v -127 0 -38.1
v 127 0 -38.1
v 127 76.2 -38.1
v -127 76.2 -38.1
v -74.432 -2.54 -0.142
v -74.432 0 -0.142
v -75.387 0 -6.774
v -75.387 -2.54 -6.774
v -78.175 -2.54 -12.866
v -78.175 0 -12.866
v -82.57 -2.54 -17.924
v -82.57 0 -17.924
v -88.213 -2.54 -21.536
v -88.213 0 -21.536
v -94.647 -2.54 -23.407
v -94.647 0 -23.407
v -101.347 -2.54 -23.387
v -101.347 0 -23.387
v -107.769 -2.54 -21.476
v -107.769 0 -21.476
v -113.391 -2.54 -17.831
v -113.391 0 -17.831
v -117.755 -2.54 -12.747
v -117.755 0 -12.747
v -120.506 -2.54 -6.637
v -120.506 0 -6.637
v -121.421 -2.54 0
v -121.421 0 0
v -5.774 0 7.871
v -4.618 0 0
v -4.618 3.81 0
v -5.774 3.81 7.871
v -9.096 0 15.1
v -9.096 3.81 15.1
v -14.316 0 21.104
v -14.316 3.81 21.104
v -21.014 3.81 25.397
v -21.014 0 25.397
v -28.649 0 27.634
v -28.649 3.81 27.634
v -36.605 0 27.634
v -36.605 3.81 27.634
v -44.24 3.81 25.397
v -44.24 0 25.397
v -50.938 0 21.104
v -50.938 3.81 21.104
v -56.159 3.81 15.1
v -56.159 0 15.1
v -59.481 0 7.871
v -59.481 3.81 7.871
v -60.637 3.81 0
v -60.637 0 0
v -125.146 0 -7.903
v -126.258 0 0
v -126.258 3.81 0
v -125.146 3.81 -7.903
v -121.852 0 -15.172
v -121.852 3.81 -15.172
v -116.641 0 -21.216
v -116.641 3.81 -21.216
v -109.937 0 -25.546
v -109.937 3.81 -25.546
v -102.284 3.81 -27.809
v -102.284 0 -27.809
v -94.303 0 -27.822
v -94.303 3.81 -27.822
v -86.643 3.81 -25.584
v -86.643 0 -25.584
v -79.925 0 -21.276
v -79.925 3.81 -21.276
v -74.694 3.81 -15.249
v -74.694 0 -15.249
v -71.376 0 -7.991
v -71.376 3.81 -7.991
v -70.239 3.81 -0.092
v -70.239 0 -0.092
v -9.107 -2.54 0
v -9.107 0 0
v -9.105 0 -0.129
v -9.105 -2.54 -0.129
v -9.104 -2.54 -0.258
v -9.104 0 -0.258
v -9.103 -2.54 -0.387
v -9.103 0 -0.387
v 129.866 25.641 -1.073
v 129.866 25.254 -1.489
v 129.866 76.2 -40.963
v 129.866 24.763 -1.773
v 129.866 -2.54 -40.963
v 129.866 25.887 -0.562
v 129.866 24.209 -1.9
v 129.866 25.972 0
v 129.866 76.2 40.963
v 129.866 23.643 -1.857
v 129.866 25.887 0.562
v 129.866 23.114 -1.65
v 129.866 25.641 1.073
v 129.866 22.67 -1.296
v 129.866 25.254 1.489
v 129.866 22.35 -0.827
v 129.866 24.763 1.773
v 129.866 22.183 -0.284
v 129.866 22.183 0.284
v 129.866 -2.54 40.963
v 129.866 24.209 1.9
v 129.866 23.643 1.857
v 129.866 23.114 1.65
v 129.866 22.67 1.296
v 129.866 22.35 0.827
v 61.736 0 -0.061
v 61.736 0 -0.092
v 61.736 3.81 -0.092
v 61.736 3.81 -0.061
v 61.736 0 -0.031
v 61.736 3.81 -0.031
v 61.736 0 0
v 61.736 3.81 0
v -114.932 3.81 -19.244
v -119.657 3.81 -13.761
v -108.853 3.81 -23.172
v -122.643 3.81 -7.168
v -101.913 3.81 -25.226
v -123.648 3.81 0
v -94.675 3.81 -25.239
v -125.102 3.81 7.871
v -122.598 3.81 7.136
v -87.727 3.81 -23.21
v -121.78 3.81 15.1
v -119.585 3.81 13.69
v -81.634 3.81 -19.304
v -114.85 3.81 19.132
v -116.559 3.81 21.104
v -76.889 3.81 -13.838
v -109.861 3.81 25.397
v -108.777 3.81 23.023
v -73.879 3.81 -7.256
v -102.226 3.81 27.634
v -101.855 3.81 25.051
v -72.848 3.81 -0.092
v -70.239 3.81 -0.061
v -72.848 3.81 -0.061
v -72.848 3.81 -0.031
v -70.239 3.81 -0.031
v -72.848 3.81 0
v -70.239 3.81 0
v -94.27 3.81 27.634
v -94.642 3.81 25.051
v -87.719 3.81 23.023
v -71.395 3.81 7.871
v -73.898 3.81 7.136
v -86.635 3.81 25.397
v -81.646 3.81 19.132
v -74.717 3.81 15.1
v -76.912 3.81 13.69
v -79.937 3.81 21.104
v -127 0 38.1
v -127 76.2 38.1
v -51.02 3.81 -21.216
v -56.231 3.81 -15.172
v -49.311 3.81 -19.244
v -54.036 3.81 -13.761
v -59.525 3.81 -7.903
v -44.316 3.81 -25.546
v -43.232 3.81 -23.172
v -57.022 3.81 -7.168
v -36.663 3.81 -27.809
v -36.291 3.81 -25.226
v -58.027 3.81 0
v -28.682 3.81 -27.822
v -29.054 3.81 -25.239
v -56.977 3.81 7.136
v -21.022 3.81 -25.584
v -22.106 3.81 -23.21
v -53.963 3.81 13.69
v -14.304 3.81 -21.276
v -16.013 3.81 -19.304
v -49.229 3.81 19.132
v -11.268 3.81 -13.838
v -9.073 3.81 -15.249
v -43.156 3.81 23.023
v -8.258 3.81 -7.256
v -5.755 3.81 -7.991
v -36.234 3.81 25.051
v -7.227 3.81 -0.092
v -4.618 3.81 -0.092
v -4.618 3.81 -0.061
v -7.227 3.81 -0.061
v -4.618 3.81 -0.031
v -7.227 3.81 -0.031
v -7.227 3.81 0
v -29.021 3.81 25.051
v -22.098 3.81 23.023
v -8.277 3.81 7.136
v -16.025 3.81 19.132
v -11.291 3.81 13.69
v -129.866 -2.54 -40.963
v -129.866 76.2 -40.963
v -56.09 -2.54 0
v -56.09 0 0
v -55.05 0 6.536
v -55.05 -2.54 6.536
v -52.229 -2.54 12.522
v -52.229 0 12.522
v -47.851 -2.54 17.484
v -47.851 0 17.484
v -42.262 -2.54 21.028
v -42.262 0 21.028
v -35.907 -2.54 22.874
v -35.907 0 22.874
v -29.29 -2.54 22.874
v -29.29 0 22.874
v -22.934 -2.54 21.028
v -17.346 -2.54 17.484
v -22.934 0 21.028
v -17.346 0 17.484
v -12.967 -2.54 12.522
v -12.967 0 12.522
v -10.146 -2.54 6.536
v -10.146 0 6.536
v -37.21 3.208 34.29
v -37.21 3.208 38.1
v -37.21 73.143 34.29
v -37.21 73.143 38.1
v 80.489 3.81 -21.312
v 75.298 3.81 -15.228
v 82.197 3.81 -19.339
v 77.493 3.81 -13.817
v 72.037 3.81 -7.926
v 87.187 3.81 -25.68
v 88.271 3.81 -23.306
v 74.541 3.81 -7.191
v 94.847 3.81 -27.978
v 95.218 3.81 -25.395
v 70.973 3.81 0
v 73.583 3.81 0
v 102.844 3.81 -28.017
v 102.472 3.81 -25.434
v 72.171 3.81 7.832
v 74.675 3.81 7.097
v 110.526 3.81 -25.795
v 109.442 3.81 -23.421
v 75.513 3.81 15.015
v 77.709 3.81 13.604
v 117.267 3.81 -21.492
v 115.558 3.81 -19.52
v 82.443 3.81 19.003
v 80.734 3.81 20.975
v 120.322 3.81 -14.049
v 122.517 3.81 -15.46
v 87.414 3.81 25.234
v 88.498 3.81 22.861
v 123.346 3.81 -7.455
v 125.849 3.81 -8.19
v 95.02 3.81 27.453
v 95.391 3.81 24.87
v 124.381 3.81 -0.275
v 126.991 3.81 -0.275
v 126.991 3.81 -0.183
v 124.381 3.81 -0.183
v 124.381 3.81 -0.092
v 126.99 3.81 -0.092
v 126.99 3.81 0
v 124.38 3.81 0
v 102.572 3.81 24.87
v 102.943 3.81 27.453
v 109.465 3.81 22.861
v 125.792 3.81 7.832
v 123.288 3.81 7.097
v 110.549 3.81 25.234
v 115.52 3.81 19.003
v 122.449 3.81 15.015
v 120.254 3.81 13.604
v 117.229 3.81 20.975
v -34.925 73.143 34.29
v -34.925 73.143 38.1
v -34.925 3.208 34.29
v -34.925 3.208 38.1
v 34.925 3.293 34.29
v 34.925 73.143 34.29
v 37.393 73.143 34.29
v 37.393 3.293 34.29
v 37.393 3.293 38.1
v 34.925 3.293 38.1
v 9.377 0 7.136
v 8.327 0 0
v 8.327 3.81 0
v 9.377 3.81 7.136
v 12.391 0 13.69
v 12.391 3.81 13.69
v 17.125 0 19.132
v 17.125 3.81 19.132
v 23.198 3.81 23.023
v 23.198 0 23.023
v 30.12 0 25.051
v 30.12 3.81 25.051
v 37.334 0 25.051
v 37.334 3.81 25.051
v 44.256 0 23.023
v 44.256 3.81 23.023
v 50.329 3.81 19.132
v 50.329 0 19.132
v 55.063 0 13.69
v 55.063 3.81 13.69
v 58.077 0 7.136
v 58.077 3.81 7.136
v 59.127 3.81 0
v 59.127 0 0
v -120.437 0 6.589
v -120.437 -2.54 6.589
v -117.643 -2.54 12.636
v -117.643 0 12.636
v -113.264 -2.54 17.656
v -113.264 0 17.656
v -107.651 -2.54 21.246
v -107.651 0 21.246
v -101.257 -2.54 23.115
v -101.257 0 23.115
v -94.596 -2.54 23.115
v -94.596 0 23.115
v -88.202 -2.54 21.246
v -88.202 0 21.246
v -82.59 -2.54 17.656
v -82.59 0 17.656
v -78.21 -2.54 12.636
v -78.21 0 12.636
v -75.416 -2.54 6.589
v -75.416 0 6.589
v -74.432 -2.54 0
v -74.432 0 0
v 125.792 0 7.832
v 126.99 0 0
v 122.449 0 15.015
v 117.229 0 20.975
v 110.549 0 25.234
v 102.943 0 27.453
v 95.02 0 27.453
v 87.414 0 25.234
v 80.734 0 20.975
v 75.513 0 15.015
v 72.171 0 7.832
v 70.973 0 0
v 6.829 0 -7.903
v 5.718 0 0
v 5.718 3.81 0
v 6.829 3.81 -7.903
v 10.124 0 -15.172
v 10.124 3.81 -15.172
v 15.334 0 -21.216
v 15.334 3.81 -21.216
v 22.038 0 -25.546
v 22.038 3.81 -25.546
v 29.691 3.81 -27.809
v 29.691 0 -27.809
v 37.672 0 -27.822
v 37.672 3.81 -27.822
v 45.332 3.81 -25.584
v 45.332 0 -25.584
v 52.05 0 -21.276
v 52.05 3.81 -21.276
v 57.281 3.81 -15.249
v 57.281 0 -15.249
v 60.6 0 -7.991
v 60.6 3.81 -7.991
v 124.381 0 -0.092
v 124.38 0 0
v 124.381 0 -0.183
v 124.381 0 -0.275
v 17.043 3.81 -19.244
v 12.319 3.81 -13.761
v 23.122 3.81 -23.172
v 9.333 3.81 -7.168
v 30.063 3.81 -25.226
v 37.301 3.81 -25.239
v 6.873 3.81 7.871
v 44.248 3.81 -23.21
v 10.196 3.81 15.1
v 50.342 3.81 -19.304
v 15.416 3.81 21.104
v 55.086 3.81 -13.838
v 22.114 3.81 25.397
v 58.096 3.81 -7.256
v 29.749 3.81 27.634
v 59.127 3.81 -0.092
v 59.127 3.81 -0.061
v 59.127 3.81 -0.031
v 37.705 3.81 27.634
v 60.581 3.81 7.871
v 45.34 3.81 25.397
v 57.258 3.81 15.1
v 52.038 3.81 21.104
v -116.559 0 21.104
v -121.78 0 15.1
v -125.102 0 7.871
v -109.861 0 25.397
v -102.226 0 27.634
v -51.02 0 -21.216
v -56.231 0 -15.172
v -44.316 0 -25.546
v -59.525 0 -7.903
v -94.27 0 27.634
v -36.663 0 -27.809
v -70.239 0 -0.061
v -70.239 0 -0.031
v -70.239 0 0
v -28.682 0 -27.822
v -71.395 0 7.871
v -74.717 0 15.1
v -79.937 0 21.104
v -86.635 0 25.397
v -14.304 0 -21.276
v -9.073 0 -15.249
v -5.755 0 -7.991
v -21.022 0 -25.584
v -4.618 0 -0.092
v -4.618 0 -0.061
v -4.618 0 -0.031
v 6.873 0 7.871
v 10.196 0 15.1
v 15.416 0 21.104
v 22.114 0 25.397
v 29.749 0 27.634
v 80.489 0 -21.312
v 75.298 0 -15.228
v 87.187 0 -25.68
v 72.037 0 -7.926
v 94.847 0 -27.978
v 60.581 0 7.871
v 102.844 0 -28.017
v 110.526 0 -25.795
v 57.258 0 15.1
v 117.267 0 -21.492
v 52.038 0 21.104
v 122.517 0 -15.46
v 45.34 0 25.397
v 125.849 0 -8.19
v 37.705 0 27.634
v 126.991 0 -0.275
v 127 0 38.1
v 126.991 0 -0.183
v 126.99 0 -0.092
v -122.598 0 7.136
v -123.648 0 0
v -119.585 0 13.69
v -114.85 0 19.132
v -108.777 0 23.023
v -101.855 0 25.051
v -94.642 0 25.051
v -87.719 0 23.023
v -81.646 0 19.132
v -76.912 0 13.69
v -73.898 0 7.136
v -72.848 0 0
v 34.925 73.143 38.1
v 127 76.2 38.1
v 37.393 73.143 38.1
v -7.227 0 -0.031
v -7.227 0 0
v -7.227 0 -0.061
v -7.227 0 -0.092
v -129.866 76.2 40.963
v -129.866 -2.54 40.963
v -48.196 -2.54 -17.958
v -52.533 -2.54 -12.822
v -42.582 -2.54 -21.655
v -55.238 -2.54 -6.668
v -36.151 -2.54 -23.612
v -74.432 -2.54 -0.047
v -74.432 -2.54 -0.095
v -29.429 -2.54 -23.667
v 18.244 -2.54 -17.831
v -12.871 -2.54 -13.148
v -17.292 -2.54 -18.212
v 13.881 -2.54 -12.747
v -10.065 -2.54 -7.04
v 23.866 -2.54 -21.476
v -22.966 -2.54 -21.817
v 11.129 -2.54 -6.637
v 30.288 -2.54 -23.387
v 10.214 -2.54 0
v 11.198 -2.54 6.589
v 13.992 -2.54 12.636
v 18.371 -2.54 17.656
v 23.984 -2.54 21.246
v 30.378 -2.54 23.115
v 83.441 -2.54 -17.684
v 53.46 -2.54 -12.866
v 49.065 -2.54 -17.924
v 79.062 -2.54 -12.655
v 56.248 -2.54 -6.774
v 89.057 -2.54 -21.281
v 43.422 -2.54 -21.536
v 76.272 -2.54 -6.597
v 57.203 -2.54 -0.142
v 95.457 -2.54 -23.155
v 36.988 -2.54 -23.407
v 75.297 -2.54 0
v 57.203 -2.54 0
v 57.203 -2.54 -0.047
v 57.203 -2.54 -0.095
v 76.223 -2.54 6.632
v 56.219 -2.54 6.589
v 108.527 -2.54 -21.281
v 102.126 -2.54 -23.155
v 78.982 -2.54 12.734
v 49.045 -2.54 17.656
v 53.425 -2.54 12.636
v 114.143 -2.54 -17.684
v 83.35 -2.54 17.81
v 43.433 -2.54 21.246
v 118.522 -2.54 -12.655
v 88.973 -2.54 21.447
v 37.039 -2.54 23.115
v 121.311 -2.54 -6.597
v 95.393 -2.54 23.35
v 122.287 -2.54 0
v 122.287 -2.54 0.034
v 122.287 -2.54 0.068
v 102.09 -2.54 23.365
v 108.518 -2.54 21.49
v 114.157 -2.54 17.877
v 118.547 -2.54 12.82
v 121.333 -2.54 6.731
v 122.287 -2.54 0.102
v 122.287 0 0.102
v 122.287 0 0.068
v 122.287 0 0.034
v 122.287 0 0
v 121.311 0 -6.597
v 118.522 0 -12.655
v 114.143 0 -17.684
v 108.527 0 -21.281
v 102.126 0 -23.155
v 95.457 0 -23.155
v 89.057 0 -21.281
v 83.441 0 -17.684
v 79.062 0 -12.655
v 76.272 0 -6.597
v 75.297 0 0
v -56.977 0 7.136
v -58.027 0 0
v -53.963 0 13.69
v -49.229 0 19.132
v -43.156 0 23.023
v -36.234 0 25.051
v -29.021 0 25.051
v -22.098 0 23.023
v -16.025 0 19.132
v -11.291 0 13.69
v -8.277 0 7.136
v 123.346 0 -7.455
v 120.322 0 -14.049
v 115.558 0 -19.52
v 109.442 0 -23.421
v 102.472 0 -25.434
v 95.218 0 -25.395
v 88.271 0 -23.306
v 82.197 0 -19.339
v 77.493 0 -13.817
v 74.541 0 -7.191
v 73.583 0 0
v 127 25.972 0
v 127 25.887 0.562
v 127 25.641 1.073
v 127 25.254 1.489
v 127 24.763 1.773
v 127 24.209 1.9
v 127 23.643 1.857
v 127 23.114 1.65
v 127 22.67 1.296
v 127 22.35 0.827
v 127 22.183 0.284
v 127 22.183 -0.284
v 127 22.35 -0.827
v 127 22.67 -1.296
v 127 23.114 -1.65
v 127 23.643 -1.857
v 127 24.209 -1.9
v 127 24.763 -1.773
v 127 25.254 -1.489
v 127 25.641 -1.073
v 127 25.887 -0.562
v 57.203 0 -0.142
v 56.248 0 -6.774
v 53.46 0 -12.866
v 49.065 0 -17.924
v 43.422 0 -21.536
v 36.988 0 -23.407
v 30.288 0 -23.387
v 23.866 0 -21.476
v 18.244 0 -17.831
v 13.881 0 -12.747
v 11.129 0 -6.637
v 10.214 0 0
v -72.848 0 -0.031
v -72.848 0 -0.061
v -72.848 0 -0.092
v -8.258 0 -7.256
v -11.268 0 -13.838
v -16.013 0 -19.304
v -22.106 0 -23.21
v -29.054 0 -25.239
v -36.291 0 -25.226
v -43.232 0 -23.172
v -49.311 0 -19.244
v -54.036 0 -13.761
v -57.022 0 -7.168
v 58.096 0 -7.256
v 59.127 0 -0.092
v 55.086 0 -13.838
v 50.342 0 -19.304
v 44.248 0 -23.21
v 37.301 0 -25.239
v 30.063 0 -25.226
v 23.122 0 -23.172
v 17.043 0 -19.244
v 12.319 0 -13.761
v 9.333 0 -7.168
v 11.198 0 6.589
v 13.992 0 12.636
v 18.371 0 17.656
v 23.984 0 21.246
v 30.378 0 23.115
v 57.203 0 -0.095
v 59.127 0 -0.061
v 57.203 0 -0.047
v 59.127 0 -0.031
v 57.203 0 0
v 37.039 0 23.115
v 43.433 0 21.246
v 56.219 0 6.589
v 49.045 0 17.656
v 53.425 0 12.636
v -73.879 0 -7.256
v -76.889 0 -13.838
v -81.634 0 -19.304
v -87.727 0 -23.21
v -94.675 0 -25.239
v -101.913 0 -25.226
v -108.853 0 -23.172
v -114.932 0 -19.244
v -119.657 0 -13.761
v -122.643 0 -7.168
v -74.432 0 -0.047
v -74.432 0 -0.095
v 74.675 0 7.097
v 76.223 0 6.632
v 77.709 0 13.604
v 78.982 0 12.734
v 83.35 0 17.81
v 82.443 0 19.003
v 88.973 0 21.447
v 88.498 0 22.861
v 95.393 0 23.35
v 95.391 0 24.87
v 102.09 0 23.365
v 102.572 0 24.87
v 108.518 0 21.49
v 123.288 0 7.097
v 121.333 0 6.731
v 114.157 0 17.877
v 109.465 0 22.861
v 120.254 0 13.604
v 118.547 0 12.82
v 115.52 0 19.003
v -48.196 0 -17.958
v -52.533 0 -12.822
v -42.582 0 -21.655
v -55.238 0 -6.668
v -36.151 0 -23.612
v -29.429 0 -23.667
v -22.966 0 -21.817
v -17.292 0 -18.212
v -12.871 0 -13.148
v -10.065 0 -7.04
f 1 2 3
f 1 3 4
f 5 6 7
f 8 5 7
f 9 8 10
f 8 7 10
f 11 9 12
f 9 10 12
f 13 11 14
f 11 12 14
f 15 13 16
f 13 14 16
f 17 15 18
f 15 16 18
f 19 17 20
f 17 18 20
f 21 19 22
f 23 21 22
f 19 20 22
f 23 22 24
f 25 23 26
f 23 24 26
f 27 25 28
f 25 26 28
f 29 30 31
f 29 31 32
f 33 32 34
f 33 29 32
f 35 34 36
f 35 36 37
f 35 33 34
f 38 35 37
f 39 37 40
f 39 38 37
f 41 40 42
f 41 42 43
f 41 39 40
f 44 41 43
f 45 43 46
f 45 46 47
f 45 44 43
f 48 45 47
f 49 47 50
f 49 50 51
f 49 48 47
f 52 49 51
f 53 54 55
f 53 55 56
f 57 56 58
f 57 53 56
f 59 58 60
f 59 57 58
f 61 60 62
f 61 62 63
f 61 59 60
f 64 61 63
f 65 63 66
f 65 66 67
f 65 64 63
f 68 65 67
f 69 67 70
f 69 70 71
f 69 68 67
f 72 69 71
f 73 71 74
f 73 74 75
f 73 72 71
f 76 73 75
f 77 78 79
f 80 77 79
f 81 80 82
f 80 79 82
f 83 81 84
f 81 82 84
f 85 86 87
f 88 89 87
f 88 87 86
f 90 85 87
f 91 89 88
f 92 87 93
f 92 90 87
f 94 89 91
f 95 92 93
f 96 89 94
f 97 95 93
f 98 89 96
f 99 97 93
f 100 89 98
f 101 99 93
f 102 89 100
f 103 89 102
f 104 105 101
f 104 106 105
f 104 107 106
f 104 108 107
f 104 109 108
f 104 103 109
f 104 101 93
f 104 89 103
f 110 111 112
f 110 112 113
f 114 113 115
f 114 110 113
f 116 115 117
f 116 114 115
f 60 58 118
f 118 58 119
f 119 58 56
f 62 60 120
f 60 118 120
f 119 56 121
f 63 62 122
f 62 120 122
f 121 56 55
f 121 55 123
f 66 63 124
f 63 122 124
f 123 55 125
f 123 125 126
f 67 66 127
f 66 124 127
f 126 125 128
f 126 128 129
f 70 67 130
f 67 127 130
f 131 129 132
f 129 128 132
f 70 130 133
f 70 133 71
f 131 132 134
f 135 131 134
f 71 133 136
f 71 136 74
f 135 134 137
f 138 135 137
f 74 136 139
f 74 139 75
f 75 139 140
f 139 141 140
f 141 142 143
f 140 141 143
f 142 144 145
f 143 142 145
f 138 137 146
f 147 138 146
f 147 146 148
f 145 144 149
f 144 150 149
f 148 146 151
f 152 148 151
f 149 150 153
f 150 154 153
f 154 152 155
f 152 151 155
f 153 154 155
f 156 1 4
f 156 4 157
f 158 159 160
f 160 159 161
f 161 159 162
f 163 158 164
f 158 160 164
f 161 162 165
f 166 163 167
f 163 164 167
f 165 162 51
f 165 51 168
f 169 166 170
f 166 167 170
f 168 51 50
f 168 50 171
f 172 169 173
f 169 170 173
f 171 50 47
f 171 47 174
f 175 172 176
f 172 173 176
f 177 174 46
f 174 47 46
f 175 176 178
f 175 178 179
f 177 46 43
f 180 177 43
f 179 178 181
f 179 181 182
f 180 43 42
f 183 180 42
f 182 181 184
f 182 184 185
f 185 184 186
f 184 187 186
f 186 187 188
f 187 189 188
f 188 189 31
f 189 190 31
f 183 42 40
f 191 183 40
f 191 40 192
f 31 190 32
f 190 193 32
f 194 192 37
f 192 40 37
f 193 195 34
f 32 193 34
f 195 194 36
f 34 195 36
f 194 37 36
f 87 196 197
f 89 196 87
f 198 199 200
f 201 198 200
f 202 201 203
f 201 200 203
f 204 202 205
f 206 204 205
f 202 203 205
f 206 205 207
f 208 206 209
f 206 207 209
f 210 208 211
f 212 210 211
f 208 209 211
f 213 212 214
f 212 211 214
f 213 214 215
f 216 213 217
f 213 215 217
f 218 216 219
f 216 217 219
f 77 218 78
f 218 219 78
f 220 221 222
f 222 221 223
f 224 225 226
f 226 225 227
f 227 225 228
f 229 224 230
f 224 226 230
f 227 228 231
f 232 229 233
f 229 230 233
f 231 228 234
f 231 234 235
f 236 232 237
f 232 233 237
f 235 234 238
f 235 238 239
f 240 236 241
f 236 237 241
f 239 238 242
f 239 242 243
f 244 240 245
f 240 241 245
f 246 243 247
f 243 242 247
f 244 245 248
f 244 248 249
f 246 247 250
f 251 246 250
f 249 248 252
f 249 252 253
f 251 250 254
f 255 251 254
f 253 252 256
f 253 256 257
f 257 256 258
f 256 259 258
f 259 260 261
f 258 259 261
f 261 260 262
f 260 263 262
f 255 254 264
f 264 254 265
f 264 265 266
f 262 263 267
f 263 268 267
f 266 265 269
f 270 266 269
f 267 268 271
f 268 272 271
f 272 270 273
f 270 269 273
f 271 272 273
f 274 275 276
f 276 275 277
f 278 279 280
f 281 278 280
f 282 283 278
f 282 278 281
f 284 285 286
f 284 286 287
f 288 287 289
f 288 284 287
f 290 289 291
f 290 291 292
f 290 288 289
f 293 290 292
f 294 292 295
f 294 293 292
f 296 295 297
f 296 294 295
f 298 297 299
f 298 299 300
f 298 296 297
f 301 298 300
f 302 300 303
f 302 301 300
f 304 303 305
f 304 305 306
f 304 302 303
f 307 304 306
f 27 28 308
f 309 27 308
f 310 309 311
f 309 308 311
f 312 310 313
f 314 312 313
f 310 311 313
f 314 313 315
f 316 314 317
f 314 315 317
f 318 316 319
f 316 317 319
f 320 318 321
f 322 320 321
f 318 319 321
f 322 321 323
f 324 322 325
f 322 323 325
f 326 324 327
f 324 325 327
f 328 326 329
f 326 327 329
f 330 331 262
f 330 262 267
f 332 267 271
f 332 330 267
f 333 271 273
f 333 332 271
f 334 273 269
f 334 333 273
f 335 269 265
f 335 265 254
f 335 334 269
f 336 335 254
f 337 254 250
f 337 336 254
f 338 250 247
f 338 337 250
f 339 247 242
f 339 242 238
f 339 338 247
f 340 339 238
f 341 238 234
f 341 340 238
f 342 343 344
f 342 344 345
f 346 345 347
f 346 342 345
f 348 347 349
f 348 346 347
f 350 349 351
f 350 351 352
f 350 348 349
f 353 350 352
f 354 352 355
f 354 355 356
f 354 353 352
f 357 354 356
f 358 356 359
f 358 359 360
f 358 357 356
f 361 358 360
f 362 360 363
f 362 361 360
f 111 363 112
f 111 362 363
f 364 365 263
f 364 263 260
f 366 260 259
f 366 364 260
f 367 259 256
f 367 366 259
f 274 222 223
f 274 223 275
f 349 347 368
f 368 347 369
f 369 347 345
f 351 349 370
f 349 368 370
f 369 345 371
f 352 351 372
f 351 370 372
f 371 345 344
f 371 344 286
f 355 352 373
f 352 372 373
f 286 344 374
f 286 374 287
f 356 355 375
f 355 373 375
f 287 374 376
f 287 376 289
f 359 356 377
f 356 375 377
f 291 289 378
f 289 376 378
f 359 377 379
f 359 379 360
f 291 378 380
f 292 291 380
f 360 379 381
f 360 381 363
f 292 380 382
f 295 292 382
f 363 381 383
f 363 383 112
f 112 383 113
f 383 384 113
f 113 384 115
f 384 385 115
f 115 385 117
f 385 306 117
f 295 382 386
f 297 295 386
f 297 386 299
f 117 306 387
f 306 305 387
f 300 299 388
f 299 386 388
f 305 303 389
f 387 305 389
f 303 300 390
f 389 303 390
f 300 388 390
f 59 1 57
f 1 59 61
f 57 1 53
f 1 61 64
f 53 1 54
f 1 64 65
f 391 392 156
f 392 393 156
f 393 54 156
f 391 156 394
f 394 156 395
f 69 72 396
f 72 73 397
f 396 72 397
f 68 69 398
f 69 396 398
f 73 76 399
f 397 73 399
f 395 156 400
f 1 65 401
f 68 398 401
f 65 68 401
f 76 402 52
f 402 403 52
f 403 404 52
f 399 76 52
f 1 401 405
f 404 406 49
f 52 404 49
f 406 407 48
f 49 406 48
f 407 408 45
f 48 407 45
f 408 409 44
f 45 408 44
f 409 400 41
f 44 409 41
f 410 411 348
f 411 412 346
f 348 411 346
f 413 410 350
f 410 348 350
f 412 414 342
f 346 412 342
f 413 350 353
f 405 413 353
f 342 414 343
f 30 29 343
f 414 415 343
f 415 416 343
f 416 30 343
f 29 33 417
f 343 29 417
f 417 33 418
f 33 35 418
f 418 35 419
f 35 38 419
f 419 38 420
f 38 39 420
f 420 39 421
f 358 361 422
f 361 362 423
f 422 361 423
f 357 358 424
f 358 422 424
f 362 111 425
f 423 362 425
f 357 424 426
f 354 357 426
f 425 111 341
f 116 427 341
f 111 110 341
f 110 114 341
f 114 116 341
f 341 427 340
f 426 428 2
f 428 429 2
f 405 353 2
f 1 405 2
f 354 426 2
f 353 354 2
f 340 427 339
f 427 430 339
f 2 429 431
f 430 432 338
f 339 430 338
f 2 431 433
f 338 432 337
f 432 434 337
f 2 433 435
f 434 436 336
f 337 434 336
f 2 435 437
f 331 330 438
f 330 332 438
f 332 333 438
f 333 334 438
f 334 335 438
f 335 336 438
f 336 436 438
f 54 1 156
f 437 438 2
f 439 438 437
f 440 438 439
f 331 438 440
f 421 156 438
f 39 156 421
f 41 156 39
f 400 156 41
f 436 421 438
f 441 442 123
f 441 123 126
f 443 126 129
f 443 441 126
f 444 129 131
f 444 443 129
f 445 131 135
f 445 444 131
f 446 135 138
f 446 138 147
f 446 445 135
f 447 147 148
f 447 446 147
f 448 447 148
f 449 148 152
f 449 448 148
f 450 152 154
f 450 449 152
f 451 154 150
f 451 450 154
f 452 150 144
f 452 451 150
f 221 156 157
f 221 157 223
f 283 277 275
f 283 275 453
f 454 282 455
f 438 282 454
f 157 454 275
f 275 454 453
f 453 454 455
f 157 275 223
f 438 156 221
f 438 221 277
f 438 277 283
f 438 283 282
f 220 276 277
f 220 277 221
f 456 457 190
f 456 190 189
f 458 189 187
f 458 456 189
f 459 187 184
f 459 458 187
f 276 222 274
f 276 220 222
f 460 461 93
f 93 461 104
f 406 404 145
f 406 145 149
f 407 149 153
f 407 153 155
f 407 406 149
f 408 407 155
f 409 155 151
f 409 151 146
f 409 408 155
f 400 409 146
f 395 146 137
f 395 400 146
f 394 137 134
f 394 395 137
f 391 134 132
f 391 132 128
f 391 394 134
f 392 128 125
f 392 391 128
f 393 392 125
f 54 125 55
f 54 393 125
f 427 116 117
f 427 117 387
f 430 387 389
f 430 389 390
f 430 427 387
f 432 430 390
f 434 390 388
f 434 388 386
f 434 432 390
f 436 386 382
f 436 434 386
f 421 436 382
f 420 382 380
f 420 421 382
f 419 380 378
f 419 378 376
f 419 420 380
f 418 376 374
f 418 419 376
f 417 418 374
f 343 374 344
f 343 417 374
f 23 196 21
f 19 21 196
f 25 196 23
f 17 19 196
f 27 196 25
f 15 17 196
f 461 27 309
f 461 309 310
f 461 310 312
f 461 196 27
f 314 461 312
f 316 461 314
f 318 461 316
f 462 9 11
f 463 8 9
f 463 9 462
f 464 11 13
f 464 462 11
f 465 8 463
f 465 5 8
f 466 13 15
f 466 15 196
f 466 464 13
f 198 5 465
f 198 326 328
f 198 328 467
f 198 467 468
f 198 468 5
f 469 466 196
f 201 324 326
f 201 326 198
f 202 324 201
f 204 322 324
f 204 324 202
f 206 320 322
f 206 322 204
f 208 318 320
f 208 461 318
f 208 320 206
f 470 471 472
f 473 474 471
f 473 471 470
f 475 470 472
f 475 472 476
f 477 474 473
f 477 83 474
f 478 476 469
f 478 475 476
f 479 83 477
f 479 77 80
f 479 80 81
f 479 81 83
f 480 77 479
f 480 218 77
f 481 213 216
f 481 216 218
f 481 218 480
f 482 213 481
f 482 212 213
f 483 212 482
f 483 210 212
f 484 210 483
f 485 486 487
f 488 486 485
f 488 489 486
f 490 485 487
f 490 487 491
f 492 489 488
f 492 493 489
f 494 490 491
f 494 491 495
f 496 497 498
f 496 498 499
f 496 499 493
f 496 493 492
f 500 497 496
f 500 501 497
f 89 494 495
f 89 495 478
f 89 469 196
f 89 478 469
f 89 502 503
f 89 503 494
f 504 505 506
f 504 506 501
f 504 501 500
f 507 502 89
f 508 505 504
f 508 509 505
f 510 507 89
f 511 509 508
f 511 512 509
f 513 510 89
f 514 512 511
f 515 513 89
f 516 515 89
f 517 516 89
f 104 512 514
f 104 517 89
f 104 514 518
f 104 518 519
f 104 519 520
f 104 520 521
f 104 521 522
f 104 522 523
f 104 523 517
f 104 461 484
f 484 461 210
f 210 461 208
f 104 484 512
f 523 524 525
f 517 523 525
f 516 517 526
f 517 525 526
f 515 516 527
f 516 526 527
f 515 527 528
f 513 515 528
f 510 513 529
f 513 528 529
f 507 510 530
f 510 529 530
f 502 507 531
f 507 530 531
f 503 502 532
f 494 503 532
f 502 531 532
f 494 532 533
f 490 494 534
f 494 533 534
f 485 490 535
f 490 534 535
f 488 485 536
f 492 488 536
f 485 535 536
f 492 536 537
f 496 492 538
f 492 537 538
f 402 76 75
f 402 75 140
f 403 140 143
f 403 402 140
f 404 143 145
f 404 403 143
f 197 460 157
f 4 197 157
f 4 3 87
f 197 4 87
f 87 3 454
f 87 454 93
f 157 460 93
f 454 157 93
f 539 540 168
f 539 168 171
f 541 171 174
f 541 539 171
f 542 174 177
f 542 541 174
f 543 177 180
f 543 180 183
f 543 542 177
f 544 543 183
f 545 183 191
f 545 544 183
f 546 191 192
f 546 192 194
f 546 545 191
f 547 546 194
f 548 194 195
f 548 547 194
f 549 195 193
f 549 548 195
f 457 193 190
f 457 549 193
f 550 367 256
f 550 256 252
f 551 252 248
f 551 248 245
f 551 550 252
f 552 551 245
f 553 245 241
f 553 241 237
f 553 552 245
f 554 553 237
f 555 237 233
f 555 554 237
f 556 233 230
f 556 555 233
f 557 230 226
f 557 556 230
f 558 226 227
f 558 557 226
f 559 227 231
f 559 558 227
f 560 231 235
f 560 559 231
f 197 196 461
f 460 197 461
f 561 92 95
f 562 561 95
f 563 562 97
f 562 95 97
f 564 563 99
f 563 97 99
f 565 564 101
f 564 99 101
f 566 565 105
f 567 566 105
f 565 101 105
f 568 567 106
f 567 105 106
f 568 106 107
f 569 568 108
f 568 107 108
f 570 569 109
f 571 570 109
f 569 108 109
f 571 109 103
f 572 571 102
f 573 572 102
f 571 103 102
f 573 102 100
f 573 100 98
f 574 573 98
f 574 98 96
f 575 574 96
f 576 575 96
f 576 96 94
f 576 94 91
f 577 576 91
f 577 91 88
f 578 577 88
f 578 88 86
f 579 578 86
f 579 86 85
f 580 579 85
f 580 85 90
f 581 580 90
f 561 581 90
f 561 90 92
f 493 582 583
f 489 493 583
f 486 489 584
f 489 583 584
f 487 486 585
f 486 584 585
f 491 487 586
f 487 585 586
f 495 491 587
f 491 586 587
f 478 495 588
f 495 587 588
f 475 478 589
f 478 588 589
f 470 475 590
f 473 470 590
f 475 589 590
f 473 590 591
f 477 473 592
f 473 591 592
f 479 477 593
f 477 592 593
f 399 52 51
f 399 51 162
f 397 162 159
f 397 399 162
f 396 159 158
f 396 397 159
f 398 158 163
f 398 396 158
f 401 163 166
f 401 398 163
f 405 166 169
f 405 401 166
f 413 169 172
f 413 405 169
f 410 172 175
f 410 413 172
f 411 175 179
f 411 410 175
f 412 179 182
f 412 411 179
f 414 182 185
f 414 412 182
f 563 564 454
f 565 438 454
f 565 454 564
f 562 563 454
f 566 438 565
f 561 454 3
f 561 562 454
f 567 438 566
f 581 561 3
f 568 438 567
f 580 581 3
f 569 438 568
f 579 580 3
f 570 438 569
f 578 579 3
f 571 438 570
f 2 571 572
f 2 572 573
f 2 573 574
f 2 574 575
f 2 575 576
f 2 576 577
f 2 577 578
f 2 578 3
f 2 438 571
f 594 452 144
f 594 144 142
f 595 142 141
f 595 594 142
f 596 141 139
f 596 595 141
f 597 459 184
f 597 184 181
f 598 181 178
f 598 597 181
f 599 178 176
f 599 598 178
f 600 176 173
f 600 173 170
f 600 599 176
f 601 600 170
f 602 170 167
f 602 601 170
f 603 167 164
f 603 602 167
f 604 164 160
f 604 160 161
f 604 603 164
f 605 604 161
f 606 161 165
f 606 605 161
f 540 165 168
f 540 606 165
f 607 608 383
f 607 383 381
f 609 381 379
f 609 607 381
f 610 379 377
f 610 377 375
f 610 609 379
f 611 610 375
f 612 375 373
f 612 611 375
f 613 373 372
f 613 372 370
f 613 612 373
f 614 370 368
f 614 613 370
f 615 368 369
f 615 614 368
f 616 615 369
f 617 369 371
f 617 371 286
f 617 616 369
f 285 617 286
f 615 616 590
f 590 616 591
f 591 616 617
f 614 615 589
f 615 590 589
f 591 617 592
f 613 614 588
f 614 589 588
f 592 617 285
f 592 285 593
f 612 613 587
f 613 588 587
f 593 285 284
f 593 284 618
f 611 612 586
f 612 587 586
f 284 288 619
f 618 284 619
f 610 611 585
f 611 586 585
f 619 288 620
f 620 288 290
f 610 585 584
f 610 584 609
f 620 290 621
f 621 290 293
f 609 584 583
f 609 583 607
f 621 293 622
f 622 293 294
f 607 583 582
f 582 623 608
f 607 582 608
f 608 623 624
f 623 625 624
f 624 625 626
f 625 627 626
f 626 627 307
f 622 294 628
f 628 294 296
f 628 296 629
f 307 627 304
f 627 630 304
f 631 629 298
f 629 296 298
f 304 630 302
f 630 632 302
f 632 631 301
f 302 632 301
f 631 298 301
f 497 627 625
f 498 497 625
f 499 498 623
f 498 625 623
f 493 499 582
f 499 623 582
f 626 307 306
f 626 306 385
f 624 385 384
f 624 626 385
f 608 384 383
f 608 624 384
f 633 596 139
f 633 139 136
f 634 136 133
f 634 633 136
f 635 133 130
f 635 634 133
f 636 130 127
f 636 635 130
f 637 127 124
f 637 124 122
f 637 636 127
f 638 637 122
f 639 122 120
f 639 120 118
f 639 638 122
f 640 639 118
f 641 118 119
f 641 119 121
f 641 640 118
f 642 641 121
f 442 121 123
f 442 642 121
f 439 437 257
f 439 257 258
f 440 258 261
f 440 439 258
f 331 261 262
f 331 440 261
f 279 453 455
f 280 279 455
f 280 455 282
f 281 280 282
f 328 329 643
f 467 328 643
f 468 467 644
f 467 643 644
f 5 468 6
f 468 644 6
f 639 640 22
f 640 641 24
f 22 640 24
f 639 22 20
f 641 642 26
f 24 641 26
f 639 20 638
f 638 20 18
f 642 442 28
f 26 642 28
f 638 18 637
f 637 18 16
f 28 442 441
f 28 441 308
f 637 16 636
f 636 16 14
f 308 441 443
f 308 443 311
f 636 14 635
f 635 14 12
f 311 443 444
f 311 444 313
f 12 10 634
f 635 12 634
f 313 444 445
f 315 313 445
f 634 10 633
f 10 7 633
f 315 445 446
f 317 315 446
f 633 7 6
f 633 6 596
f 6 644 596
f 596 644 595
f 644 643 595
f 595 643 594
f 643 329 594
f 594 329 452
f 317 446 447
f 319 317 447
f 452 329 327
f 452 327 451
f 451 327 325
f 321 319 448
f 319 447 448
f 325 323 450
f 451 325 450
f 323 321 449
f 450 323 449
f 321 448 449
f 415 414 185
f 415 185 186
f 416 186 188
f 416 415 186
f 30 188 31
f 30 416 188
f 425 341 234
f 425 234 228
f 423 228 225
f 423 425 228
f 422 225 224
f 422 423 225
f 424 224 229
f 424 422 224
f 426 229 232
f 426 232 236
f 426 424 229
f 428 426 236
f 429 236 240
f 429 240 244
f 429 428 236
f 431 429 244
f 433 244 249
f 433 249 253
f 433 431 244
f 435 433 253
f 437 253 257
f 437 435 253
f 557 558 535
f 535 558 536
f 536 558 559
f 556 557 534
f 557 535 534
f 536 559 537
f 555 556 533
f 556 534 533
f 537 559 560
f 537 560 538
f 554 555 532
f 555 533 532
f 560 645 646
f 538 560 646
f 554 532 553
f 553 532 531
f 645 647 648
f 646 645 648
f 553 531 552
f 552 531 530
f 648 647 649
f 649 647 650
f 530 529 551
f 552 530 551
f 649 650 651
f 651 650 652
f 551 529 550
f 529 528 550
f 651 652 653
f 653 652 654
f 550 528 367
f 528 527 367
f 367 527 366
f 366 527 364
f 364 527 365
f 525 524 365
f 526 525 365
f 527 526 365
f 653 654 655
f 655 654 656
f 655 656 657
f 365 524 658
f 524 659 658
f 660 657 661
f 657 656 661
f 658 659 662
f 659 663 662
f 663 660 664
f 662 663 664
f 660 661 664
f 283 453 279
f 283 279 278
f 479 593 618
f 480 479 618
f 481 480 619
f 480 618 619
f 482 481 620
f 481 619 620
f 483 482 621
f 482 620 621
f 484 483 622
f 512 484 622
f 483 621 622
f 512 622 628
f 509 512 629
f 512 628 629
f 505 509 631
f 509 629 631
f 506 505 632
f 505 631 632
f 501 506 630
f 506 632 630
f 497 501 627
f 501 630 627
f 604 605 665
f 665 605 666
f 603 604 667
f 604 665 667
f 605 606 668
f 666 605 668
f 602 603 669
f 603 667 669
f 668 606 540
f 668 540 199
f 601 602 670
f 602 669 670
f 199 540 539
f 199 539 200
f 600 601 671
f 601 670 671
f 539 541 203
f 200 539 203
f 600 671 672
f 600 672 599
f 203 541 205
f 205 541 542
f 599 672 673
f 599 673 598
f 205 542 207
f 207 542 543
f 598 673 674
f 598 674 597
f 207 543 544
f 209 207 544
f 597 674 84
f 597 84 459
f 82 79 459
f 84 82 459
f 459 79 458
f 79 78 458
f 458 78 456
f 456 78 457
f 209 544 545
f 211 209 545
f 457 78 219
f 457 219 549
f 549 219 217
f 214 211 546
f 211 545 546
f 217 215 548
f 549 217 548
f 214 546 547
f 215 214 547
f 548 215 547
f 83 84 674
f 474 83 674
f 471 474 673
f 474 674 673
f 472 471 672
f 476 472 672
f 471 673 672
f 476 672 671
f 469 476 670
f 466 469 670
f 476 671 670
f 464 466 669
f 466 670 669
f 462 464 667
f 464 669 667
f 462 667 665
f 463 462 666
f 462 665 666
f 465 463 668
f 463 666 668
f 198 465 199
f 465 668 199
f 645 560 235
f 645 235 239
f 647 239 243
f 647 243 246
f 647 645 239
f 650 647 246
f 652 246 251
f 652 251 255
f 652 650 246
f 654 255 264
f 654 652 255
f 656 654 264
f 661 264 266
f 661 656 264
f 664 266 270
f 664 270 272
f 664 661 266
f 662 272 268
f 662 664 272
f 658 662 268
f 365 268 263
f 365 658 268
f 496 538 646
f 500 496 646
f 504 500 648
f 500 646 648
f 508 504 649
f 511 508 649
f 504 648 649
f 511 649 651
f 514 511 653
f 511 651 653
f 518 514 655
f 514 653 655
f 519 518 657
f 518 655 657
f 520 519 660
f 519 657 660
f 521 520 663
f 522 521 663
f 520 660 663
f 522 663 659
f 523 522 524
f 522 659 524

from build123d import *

# Parameters (mm, degrees)
F0_W     = 259.731292
F0_H     = 81.926138
F1_DEPTH = 2.54
F2_DEPTH = 76.2
F4_DEPTH = 3.81
F5_R     = 1.905
F6_DEPTH = 25.4
F7_W     = 2.467993
F7_H     = 69.85
F8_DEPTH = 3.81


with BuildPart() as f1:
    # F0 (on Front) → F1 (new body)
    with BuildSketch(Plane.XZ):
        Rectangle(F0_W, F0_H)
        Polygon((-127, 38.1), (127, 38.1), (127, 0), (127, -38.1), (-127, -38.1), (-127, 0), align=None, mode=Mode.SUBTRACT)
        with BuildLine():
            Line((127, 0), (127, 38.1))
            Line((127, 38.1), (-127, 38.1))
            Line((-127, 38.1), (-127, 0))
            Line((-127, 0), (-121.421141, 0))
            ThreePointArc((-121.421141, 0), (-97.926572, 23.352705), (-74.432003, 0))
            Line((-74.432003, 0), (-63.5, 0))
            Line((-63.5, 0), (-56.090223, 0))
            ThreePointArc((-56.090223, 0), (-32.59841, 23.10803), (-9.106597, 0))
            Line((-9.106597, 0), (0, 0))
            Line((0, 0), (10.213884, 0))
            ThreePointArc((10.213884, 0), (33.708453, 23.352705), (57.203022, 0))
            Line((57.203022, 0), (63.5, 0))
            Line((63.5, 0), (75.297165, 0))
            ThreePointArc((75.297165, 0), (98.740752, 23.597324), (122.286942, 0.10238))
            ThreePointArc((122.286942, 0.10238), (122.286886, 0.05119), (122.286719, 0))
            Line((122.286719, 0), (127, 0))
        make_face()
        with BuildLine():
            Line((127, -38.1), (127, 0))
            Line((127, 0), (122.286719, 0))
            ThreePointArc((122.286719, 0), (98.791942, -23.39262), (75.297165, 0))
            Line((75.297165, 0), (63.5, 0))
            Line((63.5, 0), (57.203022, 0))
            ThreePointArc((57.203022, 0), (57.203345, -0.071147), (57.203453, -0.142295))
            ThreePointArc((57.203453, -0.142295), (33.637305, -23.637187), (10.213884, 0))
            Line((10.213884, 0), (0, 0))
            Line((0, 0), (-9.106597, 0))
            ThreePointArc((-9.106597, 0), (-9.104207, -0.193478), (-9.10341, -0.38697))
            ThreePointArc((-9.10341, -0.38697), (-32.791901, -23.881173), (-56.090223, 0))
            Line((-56.090223, 0), (-63.5, 0))
            Line((-63.5, 0), (-74.432003, 0))
            ThreePointArc((-74.432003, 0), (-74.43168, -0.071147), (-74.431572, -0.142295))
            ThreePointArc((-74.431572, -0.142295), (-97.99772, -23.637187), (-121.421141, 0))
            Line((-121.421141, 0), (-127, 0))
            Line((-127, 0), (-127, -38.1))
            Line((-127, -38.1), (127, -38.1))
        make_face()
    extrude(amount=F1_DEPTH)

    # F0 (on Front) → F2 (join)
    with BuildSketch(Plane.XZ):
        Rectangle(F0_W, F0_H)
        Polygon((-127, 38.1), (127, 38.1), (127, 0), (127, -38.1), (-127, -38.1), (-127, 0), align=None, mode=Mode.SUBTRACT)
    extrude(amount=-F2_DEPTH)

    # F3 (on face) → F4 (join)
    with BuildSketch(Plane.XZ):
        with BuildLine():
            Line((73.582936, 0), (70.973357, 0))
            ThreePointArc((70.973357, 0), (98.843972, -28.284051), (126.990887, -0.274948))
            ThreePointArc((126.990887, -0.274948), (126.99055, -0.137473), (126.989538, 0))
            Line((126.989538, 0), (124.379959, 0))
            ThreePointArc((124.379959, 0), (124.381075, -0.137472), (124.381448, -0.274948))
            ThreePointArc((124.381448, -0.274948), (98.843971, -25.674576), (73.582936, 0))
        make_face()
        with BuildLine():
            ThreePointArc((126.989538, 0), (98.981448, 27.734491), (70.973357, 0))
            Line((70.973357, 0), (73.582936, 0))
            ThreePointArc((73.582936, 0), (98.981448, 25.125052), (124.379959, 0))
            Line((124.379959, 0), (126.989538, 0))
        make_face()
        with BuildLine():
            ThreePointArc((61.736299, 0), (33.727009, 27.91779), (5.717719, 0))
            Line((5.717719, 0), (8.327174, 0))
            ThreePointArc((8.327174, 0), (33.727009, 25.308351), (59.126844, 0))
            Line((59.126844, 0), (61.736299, 0))
        make_face()
        with BuildLine():
            Line((8.327174, 0), (5.717719, 0))
            ThreePointArc((5.717719, 0), (33.681184, -28.101052), (61.736449, -0.091649))
            ThreePointArc((61.736449, -0.091649), (61.736411, -0.045825), (61.736299, 0))
            Line((61.736299, 0), (59.126844, 0))
            ThreePointArc((59.126844, 0), (59.126968, -0.045825), (59.127009, -0.091649))
            ThreePointArc((59.127009, -0.091649), (33.681184, -25.491608), (8.327174, 0))
        make_face()
        with BuildLine():
            ThreePointArc((-58.027052, 0), (-32.627217, 25.308351), (-7.227383, 0))
            Line((-7.227383, 0), (-4.617928, 0))
            ThreePointArc((-4.617928, 0), (-32.627217, 27.91779), (-60.636507, 0))
            Line((-60.636507, 0), (-58.027052, 0))
        make_face()
        with BuildLine():
            ThreePointArc((-7.227383, 0), (-7.227259, -0.045825), (-7.227217, -0.091649))
            ThreePointArc((-7.227217, -0.091649), (-32.673042, -25.491608), (-58.027052, 0))
            Line((-58.027052, 0), (-60.636507, 0))
            ThreePointArc((-60.636507, 0), (-32.673042, -28.101052), (-4.617778, -0.091649))
            ThreePointArc((-4.617778, -0.091649), (-4.617815, -0.045825), (-4.617928, 0))
            Line((-4.617928, 0), (-7.227383, 0))
        make_face()
        with BuildLine():
            ThreePointArc((-70.238811, -0.091649), (-70.238849, -0.045825), (-70.238961, 0))
            Line((-70.238961, 0), (-72.848416, 0))
            ThreePointArc((-72.848416, 0), (-72.848292, -0.045825), (-72.848251, -0.091649))
            ThreePointArc((-72.848251, -0.091649), (-98.294076, -25.491608), (-123.648085, 0))
            Line((-123.648085, 0), (-126.257541, 0))
            ThreePointArc((-126.257541, 0), (-98.294076, -28.101052), (-70.238811, -0.091649))
        make_face()
        with BuildLine():
            Line((-72.848416, 0), (-70.238961, 0))
            ThreePointArc((-70.238961, 0), (-98.248251, 27.91779), (-126.257541, 0))
            Line((-126.257541, 0), (-123.648085, 0))
            ThreePointArc((-123.648085, 0), (-98.248251, 25.308351), (-72.848416, 0))
        make_face()
    extrude(amount=-F4_DEPTH)

    # F5 (on face) → F6 (cut)
    with BuildSketch(Plane.YZ.offset(129.865646)):
        with Locations((24.066546, 0)):
            Circle(F5_R)
    extrude(amount=-F6_DEPTH, mode=Mode.SUBTRACT)

    # F7 (on face) → F8 (join)
    with BuildSketch(Plane(origin=(0, 0, 38.1), x_dir=(1, 0, 0), z_dir=(0, 0, -1))):
        Polygon((-37.20969, -73.142835), (-34.925, -73.142835), (-34.925, -3.292835), (-34.925, -3.207732), (-37.20969, -3.207732), align=None)
        with Locations((36.158997, -38.217835)):
            Rectangle(F7_W, F7_H)
    extrude(amount=F8_DEPTH)


solid = f1.part
